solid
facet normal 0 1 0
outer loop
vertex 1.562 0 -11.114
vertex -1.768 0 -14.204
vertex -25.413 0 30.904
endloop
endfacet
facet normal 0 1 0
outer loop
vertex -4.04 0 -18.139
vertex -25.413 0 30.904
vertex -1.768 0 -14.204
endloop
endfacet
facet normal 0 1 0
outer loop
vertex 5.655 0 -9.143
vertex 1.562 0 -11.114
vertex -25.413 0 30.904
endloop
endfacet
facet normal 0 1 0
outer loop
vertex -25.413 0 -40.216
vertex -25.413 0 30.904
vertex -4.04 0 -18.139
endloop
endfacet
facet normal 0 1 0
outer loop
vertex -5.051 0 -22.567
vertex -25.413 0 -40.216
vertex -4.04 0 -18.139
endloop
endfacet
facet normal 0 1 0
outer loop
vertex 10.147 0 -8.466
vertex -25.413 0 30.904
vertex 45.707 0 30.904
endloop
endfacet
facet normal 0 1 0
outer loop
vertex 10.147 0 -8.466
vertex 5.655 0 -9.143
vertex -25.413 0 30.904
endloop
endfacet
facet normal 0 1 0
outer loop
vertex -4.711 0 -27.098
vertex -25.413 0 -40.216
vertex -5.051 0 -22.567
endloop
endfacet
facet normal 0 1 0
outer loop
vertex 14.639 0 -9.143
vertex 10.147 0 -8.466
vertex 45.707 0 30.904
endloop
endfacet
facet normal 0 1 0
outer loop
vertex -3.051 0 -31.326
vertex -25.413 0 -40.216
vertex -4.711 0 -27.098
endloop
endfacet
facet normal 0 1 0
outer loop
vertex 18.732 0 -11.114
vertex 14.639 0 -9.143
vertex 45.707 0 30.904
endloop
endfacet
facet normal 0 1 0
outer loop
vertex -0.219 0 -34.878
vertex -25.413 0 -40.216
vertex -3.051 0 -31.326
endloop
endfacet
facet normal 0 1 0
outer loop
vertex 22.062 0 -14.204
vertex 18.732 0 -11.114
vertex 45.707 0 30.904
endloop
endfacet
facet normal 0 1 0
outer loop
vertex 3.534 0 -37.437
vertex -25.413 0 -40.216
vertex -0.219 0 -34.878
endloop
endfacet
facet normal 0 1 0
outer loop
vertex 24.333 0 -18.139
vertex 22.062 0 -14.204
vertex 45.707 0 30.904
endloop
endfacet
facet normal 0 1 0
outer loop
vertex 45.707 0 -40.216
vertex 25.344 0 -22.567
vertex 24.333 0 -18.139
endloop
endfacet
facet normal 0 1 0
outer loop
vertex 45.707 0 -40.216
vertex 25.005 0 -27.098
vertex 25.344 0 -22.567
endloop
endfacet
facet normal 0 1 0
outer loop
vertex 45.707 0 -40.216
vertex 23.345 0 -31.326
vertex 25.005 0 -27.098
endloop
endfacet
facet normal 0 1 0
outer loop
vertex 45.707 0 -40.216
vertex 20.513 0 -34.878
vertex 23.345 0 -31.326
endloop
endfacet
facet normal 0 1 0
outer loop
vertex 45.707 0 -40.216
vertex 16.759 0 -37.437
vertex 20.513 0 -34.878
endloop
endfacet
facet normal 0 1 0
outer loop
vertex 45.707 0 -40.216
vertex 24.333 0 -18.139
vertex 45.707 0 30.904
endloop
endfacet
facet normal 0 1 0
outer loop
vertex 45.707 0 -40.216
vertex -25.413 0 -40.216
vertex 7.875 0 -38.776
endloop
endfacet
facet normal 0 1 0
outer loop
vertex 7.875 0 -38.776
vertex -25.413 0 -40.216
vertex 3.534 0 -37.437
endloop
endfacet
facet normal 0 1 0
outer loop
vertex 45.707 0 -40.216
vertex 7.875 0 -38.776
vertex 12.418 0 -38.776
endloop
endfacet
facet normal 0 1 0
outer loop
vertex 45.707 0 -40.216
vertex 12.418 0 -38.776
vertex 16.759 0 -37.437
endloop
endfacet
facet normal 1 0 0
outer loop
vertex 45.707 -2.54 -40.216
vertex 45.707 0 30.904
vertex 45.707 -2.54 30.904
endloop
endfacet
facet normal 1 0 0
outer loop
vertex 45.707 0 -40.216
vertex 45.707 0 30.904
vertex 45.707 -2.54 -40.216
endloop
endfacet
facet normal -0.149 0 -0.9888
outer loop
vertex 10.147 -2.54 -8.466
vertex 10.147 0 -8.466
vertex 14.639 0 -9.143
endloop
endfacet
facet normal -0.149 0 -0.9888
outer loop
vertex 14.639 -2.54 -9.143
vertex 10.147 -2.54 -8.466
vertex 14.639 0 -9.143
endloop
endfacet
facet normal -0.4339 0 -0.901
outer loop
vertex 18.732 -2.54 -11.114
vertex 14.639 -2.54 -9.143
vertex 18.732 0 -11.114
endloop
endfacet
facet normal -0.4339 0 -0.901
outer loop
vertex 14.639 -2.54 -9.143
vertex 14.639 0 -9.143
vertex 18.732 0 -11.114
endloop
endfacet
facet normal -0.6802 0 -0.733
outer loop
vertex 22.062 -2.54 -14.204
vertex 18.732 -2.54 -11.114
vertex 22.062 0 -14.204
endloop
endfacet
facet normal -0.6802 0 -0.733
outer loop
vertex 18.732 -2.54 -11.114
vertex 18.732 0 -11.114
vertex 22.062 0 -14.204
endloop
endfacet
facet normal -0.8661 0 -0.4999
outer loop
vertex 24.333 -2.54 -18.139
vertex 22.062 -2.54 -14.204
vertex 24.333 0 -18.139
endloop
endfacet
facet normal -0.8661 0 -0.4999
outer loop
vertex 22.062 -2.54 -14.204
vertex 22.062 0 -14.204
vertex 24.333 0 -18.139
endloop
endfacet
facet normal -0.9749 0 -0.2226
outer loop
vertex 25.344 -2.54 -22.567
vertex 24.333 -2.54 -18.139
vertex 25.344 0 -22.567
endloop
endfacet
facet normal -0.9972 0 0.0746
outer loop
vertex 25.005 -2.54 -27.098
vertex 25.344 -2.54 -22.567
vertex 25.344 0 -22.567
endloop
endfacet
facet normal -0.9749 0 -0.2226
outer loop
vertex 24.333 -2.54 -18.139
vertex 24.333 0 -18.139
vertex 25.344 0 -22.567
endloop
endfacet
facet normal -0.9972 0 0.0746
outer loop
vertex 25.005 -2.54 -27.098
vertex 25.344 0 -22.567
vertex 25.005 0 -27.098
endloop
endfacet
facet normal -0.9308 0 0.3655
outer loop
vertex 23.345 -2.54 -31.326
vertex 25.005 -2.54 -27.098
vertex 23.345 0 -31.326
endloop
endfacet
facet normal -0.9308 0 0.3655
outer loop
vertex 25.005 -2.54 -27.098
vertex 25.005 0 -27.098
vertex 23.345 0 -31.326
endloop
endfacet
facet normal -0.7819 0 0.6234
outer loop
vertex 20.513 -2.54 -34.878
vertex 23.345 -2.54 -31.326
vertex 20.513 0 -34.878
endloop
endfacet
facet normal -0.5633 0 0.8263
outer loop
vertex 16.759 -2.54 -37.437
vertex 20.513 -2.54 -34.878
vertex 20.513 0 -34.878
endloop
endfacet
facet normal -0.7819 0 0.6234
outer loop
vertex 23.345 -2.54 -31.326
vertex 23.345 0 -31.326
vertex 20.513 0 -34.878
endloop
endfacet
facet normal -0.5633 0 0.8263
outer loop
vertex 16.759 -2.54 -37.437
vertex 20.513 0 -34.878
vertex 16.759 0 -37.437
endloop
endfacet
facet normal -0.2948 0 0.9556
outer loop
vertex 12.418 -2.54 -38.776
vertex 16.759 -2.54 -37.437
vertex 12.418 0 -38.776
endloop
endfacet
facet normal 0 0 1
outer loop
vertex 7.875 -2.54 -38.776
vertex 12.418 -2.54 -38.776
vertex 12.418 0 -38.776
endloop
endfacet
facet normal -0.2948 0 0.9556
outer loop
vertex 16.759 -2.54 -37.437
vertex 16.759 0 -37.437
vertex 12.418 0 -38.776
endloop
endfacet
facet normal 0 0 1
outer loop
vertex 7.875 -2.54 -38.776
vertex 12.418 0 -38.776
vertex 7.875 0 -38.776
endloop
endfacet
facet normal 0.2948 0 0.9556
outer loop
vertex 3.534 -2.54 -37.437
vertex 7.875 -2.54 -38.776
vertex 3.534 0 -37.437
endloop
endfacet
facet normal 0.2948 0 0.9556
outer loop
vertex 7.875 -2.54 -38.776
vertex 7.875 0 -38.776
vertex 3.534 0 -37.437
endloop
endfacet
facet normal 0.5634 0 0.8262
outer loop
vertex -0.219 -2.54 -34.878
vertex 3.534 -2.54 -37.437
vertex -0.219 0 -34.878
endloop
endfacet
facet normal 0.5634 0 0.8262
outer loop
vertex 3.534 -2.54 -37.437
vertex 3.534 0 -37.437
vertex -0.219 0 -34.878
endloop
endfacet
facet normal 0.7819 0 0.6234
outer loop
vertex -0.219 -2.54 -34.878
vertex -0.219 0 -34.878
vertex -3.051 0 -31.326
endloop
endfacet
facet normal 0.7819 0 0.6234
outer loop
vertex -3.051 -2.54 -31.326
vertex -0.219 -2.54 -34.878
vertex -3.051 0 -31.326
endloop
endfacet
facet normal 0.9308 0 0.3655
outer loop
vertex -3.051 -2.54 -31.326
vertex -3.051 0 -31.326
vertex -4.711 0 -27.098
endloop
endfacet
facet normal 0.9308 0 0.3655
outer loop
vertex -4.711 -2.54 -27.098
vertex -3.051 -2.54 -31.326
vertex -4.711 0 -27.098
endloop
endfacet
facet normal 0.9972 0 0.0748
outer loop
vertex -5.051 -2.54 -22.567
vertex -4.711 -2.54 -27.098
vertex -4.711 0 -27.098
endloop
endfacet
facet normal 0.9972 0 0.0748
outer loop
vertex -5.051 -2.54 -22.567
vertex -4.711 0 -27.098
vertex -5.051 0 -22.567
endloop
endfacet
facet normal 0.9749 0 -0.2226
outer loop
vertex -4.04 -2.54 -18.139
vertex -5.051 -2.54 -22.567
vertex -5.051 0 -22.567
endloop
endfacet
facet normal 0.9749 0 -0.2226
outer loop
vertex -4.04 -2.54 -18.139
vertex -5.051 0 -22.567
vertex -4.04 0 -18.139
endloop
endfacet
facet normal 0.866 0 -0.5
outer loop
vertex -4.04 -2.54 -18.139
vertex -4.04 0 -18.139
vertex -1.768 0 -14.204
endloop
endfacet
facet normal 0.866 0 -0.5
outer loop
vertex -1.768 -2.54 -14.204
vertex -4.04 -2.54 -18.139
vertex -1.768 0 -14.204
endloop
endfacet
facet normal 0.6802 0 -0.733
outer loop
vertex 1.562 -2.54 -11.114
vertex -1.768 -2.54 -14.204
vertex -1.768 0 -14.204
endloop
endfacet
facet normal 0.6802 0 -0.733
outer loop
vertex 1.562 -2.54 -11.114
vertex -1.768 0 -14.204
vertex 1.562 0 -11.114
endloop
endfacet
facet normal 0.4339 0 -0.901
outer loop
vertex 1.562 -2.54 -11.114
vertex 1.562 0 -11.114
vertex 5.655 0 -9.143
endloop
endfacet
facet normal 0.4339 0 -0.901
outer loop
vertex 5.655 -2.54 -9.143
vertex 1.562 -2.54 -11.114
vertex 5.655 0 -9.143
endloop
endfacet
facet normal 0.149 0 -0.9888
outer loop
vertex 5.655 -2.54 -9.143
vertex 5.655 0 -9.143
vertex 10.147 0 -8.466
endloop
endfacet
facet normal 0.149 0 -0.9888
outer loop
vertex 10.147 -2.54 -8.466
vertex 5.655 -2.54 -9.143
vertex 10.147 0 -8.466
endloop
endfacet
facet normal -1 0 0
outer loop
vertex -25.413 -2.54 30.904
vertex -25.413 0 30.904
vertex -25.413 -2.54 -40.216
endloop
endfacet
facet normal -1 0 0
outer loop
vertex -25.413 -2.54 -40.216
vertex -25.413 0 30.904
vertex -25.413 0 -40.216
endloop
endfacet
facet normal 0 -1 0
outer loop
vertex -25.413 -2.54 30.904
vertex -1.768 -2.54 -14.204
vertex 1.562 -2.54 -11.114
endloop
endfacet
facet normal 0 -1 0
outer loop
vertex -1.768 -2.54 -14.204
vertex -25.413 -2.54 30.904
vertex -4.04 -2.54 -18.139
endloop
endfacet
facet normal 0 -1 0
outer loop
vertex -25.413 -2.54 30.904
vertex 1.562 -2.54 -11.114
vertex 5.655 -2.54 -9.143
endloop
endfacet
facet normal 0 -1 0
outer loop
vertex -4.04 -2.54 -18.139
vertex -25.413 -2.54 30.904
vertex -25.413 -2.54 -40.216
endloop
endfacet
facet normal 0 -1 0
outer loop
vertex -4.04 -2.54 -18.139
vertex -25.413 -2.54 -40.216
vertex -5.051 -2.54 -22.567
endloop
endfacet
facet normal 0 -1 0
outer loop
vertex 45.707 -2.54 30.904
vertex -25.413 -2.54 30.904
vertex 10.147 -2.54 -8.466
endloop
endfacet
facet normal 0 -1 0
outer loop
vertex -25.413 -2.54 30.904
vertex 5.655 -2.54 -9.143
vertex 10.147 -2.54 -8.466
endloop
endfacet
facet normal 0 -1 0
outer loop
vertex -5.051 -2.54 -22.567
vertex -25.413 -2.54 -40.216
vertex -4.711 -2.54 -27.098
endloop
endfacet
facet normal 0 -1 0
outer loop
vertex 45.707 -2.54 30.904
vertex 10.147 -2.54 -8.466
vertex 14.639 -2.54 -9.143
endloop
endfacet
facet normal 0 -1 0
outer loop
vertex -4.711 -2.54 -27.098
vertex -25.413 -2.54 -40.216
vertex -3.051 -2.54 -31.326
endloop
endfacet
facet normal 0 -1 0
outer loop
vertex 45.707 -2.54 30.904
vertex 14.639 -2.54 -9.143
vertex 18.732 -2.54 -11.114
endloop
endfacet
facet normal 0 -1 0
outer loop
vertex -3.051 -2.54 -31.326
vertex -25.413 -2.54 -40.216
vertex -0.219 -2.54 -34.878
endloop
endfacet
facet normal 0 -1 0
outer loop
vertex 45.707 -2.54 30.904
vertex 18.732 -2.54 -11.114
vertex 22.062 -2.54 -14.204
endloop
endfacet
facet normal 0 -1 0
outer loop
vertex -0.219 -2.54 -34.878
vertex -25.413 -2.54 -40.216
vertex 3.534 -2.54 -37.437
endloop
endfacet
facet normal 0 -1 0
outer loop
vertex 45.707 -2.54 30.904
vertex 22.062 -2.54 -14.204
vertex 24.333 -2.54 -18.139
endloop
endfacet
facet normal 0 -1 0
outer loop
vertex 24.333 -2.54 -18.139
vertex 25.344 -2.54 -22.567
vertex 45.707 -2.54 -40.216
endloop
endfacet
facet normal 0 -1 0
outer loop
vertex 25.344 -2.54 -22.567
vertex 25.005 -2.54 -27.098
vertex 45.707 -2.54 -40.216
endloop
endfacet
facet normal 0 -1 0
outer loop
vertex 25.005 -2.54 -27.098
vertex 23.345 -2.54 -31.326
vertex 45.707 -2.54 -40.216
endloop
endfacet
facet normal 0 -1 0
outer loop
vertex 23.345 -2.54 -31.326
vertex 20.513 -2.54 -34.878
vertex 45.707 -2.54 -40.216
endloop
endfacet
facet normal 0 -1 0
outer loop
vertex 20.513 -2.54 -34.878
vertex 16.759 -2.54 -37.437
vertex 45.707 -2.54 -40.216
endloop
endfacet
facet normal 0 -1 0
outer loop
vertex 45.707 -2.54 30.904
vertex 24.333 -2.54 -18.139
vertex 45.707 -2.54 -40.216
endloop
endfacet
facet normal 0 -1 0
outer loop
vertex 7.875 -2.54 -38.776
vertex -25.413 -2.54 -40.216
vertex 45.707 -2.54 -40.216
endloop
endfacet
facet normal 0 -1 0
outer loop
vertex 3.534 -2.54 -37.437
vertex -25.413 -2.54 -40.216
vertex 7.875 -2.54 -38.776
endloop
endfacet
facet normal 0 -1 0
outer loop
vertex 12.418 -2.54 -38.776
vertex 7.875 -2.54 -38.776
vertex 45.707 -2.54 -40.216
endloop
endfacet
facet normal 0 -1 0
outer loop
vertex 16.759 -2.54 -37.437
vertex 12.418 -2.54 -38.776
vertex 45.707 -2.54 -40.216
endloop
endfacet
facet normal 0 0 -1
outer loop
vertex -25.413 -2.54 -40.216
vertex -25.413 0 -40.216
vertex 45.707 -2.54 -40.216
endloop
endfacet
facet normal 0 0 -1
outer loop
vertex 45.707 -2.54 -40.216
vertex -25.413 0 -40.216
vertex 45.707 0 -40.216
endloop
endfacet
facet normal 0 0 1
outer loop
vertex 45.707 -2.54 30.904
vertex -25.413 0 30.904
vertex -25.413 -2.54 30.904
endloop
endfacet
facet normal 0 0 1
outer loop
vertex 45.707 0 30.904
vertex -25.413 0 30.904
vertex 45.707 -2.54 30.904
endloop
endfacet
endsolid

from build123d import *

# Parameters (mm, degrees)
SKETCH1_W           = 71.12
SKETCH1_H           = 71.12
BOSS_EXTRUDE1_DEPTH = 2.54
SKETCH2_R           = 15.24
CUT_EXTRUDE1_DEPTH  = 15.748


with BuildPart() as part:
    # Sketch1 → Boss-Extrude1 (new body)
    with BuildSketch(Plane(origin=(0, 0, 0), x_dir=(1, 0, 0), z_dir=(0, 1, 0))):
        with Locations((10.146850495, 4.656355231)):
            Rectangle(SKETCH1_W, SKETCH1_H)
    extrude(amount=-BOSS_EXTRUDE1_DEPTH)

    # Sketch2 → Cut-Extrude1 (cut)
    with BuildSketch(Plane(origin=(0, 0, 0), x_dir=(1, 0, 0), z_dir=(0, 1, 0))):
        with Locations(Location((10.146850495, 23.706355231, 0), (0, 0, 270))):
            Circle(SKETCH2_R)
    extrude(amount=-CUT_EXTRUDE1_DEPTH, mode=Mode.SUBTRACT)


solid = part.part
